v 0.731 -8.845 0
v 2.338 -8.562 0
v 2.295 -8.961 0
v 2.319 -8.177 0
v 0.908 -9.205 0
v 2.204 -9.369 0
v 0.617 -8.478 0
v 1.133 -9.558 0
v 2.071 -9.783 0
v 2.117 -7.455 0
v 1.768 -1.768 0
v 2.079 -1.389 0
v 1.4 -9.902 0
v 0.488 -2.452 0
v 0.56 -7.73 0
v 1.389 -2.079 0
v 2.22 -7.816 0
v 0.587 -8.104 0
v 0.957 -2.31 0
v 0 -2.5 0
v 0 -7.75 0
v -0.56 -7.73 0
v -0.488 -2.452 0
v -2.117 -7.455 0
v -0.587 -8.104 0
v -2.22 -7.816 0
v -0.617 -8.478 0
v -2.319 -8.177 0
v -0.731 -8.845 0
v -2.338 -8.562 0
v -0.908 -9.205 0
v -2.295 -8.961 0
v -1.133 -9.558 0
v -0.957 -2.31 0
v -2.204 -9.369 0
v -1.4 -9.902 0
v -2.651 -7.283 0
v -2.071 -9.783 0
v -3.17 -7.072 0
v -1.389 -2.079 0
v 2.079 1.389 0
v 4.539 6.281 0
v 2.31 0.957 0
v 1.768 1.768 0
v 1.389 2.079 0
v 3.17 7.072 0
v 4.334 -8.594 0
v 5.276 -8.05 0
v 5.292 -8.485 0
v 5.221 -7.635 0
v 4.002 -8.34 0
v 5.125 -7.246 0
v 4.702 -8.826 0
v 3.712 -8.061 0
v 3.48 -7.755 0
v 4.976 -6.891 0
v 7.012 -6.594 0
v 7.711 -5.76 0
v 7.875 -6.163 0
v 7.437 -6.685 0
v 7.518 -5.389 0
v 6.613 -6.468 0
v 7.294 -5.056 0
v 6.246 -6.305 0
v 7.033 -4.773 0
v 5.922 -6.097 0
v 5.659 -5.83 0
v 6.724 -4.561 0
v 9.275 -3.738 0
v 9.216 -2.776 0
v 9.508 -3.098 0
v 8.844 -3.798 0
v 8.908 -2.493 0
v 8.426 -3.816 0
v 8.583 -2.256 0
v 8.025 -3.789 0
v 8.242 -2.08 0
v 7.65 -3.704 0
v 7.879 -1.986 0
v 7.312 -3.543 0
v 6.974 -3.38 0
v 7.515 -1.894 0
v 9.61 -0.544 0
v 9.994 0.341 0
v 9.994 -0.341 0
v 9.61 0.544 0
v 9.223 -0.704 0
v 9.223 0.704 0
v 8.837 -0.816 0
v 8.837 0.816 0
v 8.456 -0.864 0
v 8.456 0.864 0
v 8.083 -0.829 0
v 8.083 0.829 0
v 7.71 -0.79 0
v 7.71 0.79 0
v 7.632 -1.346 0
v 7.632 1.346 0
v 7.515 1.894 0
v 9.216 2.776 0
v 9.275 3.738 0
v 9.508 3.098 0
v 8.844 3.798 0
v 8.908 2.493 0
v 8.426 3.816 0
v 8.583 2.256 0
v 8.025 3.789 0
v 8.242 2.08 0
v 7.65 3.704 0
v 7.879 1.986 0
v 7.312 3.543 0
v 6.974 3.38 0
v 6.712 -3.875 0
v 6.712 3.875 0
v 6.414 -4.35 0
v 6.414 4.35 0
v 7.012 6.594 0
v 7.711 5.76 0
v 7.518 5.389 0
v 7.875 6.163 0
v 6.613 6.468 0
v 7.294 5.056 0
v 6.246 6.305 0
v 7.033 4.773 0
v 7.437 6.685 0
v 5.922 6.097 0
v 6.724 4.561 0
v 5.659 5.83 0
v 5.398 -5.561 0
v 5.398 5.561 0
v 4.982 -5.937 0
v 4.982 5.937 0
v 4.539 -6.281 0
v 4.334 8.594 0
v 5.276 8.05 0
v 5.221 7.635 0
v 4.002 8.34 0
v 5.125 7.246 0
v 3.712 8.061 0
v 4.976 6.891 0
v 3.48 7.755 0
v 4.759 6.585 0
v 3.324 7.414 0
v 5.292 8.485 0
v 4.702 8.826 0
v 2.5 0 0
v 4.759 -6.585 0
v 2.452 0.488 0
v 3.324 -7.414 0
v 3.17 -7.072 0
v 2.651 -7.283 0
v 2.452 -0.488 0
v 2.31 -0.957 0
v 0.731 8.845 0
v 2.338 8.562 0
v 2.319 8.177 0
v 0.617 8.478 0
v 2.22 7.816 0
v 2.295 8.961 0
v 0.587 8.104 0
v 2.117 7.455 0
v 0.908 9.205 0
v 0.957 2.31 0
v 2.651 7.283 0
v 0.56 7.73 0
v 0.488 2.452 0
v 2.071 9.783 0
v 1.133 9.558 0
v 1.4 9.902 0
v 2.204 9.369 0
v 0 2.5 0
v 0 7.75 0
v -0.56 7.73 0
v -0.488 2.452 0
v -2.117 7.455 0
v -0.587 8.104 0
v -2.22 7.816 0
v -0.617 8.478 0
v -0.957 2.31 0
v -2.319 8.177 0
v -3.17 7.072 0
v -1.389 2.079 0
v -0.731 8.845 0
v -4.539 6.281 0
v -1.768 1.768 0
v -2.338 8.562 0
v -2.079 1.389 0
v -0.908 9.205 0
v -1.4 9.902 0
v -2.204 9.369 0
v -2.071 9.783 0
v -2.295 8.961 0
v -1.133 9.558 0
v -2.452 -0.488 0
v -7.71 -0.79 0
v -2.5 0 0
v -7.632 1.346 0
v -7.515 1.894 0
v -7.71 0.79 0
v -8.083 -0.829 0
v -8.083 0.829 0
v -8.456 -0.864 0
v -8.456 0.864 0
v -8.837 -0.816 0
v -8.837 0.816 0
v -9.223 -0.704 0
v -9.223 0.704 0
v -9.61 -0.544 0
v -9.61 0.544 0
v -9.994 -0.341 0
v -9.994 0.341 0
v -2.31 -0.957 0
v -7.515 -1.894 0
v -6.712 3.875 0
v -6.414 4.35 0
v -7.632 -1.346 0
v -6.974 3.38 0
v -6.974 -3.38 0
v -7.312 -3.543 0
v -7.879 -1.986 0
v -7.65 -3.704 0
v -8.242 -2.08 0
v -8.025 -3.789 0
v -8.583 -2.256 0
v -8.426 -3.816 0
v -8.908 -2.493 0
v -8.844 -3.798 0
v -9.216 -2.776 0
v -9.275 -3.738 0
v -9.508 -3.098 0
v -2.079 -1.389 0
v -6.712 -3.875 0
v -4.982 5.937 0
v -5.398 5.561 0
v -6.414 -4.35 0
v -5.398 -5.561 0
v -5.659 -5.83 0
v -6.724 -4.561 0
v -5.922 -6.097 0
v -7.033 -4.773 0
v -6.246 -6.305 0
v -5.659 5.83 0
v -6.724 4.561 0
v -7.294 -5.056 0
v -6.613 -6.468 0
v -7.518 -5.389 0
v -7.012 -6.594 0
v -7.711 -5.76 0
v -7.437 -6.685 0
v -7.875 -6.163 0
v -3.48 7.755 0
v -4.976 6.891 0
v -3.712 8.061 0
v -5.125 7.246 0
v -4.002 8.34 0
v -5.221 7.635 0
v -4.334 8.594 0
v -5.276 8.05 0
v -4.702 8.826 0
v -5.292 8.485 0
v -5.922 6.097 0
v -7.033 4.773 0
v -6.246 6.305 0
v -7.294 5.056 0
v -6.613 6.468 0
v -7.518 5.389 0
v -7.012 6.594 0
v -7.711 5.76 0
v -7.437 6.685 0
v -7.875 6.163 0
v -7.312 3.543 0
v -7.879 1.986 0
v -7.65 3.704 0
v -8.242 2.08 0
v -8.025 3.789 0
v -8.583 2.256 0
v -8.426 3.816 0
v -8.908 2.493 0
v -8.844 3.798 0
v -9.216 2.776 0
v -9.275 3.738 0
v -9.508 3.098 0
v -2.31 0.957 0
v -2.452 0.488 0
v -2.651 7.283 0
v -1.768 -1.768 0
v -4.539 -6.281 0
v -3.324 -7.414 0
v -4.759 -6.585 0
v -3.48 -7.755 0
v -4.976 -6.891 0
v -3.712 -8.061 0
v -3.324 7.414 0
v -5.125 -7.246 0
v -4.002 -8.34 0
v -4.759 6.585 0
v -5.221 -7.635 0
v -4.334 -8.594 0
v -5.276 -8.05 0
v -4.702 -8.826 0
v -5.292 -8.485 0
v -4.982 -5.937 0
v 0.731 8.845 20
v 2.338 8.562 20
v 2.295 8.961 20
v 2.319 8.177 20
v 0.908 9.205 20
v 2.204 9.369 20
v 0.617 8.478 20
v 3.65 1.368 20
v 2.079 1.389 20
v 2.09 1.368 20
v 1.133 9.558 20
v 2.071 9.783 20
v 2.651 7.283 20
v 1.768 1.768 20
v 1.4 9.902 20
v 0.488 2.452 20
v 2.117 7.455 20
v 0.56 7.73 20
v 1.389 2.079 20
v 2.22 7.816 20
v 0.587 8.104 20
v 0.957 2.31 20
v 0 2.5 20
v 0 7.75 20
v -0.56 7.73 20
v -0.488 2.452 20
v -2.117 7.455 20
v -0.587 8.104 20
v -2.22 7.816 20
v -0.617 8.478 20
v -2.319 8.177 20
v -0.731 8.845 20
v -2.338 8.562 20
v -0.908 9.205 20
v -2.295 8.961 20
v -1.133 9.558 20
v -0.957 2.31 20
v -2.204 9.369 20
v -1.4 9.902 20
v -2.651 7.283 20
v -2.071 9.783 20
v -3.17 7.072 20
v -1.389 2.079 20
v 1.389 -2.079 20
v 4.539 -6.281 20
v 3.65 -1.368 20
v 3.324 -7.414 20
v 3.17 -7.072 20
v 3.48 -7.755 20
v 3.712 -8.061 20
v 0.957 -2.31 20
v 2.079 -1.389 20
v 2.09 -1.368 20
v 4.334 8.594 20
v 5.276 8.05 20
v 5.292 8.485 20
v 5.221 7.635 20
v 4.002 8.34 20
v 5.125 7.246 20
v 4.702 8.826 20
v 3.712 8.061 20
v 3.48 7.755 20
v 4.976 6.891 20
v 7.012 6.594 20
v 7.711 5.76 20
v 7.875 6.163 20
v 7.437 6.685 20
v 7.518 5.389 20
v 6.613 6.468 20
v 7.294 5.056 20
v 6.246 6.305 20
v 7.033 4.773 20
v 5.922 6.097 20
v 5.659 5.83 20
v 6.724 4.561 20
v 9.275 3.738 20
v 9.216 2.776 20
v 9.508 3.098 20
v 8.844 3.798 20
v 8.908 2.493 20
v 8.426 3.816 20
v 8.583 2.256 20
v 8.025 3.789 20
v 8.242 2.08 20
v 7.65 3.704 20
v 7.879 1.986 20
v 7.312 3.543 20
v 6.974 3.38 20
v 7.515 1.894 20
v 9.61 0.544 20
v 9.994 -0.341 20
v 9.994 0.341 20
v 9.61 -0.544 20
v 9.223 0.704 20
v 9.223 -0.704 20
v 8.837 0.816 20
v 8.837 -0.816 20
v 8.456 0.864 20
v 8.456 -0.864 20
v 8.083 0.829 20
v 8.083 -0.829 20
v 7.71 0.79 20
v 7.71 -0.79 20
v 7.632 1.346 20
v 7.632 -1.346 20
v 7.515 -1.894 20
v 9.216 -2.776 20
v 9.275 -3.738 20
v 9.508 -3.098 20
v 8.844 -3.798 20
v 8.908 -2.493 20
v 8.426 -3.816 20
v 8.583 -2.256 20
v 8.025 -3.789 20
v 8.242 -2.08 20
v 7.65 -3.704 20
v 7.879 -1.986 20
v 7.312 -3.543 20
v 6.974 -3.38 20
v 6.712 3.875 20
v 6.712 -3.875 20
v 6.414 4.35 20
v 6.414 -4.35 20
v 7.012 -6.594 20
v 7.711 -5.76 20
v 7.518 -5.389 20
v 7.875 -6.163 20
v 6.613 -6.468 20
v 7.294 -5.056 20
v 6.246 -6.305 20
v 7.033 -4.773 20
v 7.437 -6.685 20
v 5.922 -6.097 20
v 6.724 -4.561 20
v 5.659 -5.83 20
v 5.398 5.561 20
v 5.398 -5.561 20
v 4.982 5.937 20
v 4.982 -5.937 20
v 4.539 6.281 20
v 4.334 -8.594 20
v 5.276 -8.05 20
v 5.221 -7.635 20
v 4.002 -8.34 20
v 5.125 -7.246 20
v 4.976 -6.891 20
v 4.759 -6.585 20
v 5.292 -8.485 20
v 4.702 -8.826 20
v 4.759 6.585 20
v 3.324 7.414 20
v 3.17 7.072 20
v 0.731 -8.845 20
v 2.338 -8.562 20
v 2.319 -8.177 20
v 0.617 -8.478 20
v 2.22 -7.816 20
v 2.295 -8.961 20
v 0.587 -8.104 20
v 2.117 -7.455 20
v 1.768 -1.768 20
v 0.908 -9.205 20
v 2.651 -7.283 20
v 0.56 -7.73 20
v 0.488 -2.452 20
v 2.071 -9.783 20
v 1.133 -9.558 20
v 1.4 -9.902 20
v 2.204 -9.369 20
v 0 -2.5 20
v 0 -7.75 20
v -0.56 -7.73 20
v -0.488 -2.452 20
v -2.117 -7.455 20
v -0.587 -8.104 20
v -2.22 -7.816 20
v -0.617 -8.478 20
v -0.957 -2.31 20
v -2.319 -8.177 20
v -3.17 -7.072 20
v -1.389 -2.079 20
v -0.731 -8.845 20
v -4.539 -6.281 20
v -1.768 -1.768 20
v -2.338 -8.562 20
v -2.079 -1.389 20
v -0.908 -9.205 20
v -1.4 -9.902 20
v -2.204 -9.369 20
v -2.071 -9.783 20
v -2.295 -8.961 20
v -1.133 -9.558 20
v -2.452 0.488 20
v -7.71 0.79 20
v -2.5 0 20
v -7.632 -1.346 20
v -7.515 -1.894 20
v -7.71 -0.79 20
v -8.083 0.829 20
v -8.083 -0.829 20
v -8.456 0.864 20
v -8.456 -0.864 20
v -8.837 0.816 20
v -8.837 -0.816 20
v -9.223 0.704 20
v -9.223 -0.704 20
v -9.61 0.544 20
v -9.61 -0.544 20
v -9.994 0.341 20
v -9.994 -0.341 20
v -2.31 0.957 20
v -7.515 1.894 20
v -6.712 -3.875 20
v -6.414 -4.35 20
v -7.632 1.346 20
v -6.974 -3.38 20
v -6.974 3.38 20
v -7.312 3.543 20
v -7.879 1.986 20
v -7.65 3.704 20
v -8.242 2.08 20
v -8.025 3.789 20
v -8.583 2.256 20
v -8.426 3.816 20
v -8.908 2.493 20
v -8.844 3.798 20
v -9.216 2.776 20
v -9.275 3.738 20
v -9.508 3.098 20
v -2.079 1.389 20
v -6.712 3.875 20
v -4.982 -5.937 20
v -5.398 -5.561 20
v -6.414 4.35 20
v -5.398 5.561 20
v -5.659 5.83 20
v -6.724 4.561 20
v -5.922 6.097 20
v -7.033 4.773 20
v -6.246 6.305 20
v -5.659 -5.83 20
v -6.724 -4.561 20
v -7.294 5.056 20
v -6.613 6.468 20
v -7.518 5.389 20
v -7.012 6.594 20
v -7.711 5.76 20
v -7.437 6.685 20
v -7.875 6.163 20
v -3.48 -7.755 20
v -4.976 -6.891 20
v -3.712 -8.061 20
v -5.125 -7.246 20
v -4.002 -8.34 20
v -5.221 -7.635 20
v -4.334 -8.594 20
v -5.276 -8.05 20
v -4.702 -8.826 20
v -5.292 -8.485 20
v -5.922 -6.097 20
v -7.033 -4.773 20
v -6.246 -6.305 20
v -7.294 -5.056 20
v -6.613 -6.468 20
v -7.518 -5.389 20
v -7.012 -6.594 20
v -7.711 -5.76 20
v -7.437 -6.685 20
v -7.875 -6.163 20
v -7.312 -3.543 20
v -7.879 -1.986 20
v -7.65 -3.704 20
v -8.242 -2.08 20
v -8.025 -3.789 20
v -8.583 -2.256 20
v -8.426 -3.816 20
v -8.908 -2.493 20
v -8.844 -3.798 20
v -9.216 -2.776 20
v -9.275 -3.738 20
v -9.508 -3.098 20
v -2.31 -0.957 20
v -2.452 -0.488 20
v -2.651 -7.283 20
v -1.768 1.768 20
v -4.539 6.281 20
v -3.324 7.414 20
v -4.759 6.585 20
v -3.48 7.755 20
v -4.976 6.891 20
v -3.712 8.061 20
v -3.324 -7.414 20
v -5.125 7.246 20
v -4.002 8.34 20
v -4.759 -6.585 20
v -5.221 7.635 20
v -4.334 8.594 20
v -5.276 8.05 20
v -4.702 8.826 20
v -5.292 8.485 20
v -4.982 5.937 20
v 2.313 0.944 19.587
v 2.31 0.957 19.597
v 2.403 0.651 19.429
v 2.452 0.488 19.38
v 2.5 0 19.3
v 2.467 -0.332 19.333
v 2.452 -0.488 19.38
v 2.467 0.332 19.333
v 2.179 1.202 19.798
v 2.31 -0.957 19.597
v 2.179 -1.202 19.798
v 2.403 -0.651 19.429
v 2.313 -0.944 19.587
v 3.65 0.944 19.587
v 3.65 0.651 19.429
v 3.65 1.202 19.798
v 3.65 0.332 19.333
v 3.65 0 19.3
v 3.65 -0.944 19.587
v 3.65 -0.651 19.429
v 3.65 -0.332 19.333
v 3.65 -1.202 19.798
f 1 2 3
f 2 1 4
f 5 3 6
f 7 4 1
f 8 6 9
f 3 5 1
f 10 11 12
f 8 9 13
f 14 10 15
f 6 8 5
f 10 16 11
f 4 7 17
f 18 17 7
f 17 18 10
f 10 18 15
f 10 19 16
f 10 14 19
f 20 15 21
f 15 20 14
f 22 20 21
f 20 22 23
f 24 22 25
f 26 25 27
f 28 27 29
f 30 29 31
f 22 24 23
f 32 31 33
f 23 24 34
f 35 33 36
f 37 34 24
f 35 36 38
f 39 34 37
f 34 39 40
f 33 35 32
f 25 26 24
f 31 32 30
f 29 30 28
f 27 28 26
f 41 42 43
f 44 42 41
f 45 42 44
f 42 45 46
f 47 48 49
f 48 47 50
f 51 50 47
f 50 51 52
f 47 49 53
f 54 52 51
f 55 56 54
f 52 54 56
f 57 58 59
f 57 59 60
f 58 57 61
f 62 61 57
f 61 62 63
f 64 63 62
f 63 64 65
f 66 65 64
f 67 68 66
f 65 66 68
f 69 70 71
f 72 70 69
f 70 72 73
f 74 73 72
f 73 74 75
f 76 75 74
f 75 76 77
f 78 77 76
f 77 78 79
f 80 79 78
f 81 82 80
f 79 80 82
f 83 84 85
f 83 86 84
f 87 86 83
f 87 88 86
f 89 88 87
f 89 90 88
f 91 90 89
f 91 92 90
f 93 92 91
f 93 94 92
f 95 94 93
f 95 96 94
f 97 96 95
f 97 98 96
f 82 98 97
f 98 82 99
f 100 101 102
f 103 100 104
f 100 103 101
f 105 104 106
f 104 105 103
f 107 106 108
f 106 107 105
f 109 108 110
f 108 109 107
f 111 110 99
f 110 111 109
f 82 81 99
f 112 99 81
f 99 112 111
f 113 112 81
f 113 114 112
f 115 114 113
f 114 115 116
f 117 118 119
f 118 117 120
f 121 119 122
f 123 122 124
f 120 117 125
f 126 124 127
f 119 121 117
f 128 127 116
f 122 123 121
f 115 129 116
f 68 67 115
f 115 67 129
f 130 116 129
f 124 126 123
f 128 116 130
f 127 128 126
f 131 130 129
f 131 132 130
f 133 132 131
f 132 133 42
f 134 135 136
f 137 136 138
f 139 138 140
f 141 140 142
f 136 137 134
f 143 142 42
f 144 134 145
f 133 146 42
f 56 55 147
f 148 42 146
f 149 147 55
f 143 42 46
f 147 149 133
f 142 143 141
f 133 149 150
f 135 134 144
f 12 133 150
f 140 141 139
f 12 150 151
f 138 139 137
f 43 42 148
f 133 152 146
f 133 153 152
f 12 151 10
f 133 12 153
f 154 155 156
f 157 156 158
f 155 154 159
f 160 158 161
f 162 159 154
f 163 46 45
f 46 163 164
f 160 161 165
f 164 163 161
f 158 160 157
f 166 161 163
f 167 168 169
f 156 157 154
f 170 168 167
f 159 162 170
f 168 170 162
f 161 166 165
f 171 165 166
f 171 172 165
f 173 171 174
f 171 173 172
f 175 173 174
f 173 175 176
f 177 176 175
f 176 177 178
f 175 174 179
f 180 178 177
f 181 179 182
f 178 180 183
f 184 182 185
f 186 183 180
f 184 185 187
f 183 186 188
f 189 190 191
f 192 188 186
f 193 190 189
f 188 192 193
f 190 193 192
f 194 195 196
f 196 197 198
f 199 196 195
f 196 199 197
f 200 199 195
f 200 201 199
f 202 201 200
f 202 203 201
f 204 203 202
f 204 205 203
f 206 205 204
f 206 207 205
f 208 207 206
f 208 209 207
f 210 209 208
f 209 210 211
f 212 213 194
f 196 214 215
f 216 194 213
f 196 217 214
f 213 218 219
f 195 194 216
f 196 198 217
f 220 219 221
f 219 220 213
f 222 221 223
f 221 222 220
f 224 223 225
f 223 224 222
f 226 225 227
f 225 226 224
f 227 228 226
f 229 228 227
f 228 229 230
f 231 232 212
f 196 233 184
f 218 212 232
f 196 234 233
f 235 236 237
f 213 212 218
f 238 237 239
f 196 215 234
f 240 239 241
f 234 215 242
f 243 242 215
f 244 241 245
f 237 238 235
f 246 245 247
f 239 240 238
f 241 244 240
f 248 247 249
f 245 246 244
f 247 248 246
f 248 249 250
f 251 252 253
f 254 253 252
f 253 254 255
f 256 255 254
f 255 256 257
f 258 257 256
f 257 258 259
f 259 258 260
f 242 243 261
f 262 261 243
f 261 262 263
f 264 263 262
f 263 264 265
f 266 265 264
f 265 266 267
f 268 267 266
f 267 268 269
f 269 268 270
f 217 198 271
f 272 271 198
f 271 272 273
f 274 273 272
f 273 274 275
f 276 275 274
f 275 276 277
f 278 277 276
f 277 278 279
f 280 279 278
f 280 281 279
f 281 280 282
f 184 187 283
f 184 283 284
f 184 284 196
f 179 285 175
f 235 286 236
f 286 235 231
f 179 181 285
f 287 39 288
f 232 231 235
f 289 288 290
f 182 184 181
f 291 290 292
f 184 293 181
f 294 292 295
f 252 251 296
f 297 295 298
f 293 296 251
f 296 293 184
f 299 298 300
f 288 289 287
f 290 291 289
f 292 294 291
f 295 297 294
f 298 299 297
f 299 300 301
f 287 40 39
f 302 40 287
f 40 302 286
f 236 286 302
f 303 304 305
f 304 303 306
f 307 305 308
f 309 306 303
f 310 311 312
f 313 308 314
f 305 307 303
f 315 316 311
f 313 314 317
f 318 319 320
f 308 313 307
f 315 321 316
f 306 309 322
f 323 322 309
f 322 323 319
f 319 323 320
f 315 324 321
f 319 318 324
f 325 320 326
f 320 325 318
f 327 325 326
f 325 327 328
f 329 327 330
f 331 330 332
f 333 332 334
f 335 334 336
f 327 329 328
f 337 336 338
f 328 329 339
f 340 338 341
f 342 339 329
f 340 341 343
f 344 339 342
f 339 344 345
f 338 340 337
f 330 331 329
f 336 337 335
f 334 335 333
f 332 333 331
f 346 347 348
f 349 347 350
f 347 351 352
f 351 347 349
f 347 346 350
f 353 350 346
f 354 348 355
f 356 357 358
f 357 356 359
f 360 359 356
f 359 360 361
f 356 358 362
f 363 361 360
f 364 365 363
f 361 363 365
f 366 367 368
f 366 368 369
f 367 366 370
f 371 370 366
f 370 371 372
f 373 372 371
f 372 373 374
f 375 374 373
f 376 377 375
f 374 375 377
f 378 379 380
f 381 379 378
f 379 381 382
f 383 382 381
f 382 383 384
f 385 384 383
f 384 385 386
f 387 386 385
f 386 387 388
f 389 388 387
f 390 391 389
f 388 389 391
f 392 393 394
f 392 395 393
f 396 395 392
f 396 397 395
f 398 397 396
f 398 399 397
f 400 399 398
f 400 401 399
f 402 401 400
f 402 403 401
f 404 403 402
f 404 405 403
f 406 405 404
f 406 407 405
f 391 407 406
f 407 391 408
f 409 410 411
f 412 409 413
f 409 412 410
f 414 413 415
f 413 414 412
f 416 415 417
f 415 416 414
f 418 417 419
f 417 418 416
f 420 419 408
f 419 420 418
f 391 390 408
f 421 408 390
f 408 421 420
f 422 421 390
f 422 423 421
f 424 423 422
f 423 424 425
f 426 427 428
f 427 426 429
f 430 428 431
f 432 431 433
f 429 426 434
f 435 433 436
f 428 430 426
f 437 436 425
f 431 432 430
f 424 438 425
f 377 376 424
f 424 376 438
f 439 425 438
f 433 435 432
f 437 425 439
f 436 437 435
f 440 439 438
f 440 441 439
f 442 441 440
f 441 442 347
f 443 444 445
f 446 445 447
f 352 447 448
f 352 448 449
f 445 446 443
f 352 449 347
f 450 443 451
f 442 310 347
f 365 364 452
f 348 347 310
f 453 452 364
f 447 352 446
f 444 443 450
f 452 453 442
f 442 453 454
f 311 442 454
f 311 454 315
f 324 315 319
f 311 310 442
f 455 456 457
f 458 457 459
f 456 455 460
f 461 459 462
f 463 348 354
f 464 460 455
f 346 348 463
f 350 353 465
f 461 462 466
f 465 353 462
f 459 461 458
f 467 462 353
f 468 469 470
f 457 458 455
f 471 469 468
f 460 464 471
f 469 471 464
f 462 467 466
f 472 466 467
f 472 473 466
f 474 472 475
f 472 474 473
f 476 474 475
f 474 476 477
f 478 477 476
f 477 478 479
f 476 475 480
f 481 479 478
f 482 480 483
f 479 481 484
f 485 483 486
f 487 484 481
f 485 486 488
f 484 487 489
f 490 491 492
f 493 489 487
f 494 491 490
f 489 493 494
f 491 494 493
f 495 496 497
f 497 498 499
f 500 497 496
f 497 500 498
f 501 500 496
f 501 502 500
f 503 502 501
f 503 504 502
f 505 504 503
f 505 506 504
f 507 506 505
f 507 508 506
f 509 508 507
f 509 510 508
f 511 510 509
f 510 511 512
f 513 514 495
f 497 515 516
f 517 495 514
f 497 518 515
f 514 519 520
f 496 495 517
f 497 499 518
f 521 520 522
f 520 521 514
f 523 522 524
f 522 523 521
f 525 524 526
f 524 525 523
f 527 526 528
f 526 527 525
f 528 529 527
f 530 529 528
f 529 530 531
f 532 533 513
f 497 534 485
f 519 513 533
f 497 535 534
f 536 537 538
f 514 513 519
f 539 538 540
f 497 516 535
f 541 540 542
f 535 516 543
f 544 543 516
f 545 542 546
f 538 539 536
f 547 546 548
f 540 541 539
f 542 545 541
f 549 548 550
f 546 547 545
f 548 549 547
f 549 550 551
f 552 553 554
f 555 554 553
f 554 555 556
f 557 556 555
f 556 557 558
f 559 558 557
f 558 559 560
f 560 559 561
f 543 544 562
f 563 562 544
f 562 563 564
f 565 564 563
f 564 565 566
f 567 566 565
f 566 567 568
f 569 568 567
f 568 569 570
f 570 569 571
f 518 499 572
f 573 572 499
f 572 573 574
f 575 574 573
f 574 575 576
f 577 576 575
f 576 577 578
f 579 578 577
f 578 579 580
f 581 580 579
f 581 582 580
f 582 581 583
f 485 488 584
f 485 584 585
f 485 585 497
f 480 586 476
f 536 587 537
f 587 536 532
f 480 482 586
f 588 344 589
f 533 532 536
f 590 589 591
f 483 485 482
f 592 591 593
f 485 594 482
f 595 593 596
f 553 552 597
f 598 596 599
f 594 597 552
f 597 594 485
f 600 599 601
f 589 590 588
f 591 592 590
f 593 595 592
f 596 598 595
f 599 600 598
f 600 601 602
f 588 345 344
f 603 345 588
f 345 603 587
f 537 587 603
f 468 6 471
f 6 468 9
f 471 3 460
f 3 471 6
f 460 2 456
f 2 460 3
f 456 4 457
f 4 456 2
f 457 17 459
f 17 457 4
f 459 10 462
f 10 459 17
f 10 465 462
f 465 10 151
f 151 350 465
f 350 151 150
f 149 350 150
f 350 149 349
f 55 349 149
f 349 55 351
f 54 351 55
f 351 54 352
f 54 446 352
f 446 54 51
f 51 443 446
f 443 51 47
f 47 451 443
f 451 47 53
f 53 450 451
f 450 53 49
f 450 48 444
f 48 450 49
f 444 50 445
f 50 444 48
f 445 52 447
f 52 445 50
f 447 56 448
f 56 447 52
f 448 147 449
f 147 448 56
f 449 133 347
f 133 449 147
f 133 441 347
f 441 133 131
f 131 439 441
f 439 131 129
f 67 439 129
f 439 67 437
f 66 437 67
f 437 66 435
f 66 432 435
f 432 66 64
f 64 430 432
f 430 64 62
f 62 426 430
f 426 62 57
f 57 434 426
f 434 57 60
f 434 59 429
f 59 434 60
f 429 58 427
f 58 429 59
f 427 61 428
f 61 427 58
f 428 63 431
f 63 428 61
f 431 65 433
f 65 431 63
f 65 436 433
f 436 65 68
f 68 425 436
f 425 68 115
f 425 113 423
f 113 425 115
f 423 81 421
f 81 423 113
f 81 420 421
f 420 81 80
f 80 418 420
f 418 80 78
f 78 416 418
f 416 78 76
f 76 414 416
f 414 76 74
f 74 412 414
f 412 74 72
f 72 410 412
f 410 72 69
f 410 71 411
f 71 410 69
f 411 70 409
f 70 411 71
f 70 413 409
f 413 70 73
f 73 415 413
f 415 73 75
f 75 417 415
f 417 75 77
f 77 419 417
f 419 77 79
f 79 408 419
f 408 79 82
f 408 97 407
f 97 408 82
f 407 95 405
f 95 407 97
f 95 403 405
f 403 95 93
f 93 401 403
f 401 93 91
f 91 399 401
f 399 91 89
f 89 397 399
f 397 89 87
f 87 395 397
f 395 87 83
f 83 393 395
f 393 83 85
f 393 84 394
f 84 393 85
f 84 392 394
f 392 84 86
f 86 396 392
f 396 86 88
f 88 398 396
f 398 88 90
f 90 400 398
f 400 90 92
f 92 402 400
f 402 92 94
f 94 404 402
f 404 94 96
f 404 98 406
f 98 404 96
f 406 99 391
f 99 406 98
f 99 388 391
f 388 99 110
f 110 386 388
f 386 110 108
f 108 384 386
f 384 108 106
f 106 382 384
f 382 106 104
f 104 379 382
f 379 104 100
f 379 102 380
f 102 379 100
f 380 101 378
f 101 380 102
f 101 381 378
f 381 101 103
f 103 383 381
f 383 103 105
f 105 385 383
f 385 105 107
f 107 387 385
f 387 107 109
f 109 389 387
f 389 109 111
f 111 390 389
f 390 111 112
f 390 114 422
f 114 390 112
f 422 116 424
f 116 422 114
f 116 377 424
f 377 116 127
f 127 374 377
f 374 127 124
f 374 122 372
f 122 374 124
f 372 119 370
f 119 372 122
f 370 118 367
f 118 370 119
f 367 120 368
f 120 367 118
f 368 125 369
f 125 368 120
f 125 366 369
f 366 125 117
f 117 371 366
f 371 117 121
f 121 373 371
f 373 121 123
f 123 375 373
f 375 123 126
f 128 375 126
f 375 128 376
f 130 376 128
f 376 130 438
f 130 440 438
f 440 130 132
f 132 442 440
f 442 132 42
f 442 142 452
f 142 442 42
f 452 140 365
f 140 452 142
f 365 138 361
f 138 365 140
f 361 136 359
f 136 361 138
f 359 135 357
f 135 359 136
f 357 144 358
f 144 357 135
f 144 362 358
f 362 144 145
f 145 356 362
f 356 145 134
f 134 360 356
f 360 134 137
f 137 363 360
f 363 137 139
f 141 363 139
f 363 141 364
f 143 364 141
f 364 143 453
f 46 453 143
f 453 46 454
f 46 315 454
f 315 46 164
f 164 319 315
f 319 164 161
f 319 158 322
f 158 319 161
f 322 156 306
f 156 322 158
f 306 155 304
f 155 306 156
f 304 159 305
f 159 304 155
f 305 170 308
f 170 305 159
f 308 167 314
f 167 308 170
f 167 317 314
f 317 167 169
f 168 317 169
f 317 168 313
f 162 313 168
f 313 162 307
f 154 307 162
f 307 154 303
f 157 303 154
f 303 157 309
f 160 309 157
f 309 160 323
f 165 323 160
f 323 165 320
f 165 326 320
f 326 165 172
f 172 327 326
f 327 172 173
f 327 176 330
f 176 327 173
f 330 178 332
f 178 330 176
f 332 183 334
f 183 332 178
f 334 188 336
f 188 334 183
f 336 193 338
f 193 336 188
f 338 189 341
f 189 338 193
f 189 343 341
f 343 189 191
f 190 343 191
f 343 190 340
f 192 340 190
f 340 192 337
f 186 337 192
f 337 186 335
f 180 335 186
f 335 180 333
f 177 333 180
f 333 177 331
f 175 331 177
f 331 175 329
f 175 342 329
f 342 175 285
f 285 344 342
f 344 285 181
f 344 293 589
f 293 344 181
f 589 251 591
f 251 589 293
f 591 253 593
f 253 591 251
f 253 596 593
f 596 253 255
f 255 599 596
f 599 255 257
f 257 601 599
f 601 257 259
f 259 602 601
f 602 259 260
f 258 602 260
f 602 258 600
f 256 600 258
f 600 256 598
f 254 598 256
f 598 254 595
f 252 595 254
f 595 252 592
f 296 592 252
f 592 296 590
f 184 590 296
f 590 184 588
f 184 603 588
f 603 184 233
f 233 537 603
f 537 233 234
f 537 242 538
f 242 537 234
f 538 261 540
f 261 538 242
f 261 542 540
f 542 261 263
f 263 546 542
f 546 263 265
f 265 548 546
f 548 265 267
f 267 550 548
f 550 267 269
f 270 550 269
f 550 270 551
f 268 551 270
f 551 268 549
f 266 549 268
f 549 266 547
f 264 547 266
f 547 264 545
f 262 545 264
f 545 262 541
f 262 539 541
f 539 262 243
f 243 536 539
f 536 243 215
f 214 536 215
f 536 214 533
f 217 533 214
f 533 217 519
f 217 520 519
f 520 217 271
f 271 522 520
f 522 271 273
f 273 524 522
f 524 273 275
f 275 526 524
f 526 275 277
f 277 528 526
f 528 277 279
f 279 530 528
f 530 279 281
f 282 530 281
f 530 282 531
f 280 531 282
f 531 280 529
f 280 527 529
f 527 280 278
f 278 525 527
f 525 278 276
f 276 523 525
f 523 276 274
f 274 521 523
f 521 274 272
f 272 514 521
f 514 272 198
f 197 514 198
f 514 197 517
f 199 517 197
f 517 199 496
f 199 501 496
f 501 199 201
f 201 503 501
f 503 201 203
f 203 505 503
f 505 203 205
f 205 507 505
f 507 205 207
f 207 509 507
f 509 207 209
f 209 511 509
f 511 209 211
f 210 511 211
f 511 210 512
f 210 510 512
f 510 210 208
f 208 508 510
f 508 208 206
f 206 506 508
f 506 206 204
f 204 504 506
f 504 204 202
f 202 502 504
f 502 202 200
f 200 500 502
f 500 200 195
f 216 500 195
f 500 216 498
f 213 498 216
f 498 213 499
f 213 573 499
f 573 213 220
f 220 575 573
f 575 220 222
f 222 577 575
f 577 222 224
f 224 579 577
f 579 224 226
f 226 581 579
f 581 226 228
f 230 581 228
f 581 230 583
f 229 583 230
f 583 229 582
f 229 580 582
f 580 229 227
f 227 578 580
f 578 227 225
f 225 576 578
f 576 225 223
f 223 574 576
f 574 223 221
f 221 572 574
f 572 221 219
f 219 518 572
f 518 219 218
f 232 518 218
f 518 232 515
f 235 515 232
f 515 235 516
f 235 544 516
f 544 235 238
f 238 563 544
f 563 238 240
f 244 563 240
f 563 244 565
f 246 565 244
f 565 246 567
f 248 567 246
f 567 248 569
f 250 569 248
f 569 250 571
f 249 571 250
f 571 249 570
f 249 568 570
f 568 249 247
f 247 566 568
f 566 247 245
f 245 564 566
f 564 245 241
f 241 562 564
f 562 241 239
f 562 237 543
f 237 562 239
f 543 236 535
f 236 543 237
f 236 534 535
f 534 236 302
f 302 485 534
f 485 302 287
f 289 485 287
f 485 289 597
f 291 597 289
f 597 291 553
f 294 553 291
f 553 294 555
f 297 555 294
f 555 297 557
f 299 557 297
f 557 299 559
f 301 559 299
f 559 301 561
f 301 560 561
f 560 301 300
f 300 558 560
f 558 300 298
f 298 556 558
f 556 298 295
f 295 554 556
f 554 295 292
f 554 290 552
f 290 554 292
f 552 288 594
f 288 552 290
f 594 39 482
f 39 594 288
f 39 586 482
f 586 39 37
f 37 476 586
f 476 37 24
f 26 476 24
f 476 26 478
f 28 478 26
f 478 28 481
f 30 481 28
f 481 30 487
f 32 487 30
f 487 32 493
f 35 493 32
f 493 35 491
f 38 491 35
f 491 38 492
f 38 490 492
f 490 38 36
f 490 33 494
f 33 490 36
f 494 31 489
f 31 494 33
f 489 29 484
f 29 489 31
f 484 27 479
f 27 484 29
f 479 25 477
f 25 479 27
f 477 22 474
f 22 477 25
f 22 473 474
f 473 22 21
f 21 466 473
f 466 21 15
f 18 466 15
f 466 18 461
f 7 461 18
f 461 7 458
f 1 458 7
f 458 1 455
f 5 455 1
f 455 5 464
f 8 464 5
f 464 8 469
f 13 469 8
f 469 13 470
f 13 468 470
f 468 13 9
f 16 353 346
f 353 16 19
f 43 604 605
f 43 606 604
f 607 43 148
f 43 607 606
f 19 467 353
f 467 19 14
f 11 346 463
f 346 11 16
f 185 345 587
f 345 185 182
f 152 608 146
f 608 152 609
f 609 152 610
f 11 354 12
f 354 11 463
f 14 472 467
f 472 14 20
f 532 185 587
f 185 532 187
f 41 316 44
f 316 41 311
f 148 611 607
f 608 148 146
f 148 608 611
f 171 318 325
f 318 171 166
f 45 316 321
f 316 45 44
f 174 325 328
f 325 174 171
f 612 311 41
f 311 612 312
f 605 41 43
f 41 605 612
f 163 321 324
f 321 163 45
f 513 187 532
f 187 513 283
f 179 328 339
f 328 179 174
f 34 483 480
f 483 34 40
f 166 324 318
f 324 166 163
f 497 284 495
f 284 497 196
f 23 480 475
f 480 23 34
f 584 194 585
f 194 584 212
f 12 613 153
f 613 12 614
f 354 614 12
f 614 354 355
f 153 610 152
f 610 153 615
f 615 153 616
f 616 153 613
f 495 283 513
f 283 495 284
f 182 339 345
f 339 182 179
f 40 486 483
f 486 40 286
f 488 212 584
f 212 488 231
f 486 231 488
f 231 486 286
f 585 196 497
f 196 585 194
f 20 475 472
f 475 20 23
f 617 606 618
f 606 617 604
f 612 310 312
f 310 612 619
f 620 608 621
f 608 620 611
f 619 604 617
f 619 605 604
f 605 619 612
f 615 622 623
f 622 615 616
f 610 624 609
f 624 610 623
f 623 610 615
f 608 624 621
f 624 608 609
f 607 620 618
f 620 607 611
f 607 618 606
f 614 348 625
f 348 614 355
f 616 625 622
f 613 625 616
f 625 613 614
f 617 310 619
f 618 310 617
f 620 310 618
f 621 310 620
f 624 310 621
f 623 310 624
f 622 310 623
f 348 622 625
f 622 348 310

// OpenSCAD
$fn = 32;

// ----------------------------------------------------------------------
// Spur gear: m=1 z=18, 20 mm tip diameter x 20 mm
// ----------------------------------------------------------------------

// --- parameters (mm) ---
gear_module = 1;          // module
tooth_count = 18;         // number of teeth
gear_w = 20;              // face width
pa = 20;                  // pressure angle, deg
bore = 5;                 // shaft bore
set_d = 3.4;              // set screw tap hole
set_z = 21;               // set screw height

/* --- involute profile --- */
pitch_r = gear_module * tooth_count / 2;
base_r = pitch_r * cos(pa);
tip_r = pitch_r + gear_module;
root_r = pitch_r - 1.25 * gear_module;
flank_steps = 6;

function inv_deg(a) = (tan(a) - a * PI / 180) * 180 / PI;
function flank_r(i) = root_r + (tip_r - root_r) * i / flank_steps;
function half_angle(r) = 90 / tooth_count + inv_deg(pa) - inv_deg(acos(min(1, base_r / r)));
function tooth_pt(k, i, side) =
    let (r = flank_r(i), a = k * 360 / tooth_count + side * half_angle(r))
    [r * cos(a), r * sin(a)];

module tooth_profile() {
  polygon(points = [
    for (k = [0 : tooth_count - 1])
      each [
        for (i = [0 : flank_steps]) tooth_pt(k, i, -1),
        for (i = [flank_steps : -1 : 0]) tooth_pt(k, i, 1),
        let (ta = (k + 0.5) * 360 / tooth_count)
          [root_r * cos(ta), root_r * sin(ta)]
      ]
  ]);
}

module gear_disc() {
  linear_extrude(height = gear_w) tooth_profile();
}

difference() {
  gear_disc();
  translate([0, 0, -1]) cylinder(h = gear_w + 3, d = bore);
  /* set screw, drilled radially */
  translate([-1, 0, set_z]) rotate([0, 90, 0]) cylinder(h = (root_r * 0.6), d = set_d);
}
